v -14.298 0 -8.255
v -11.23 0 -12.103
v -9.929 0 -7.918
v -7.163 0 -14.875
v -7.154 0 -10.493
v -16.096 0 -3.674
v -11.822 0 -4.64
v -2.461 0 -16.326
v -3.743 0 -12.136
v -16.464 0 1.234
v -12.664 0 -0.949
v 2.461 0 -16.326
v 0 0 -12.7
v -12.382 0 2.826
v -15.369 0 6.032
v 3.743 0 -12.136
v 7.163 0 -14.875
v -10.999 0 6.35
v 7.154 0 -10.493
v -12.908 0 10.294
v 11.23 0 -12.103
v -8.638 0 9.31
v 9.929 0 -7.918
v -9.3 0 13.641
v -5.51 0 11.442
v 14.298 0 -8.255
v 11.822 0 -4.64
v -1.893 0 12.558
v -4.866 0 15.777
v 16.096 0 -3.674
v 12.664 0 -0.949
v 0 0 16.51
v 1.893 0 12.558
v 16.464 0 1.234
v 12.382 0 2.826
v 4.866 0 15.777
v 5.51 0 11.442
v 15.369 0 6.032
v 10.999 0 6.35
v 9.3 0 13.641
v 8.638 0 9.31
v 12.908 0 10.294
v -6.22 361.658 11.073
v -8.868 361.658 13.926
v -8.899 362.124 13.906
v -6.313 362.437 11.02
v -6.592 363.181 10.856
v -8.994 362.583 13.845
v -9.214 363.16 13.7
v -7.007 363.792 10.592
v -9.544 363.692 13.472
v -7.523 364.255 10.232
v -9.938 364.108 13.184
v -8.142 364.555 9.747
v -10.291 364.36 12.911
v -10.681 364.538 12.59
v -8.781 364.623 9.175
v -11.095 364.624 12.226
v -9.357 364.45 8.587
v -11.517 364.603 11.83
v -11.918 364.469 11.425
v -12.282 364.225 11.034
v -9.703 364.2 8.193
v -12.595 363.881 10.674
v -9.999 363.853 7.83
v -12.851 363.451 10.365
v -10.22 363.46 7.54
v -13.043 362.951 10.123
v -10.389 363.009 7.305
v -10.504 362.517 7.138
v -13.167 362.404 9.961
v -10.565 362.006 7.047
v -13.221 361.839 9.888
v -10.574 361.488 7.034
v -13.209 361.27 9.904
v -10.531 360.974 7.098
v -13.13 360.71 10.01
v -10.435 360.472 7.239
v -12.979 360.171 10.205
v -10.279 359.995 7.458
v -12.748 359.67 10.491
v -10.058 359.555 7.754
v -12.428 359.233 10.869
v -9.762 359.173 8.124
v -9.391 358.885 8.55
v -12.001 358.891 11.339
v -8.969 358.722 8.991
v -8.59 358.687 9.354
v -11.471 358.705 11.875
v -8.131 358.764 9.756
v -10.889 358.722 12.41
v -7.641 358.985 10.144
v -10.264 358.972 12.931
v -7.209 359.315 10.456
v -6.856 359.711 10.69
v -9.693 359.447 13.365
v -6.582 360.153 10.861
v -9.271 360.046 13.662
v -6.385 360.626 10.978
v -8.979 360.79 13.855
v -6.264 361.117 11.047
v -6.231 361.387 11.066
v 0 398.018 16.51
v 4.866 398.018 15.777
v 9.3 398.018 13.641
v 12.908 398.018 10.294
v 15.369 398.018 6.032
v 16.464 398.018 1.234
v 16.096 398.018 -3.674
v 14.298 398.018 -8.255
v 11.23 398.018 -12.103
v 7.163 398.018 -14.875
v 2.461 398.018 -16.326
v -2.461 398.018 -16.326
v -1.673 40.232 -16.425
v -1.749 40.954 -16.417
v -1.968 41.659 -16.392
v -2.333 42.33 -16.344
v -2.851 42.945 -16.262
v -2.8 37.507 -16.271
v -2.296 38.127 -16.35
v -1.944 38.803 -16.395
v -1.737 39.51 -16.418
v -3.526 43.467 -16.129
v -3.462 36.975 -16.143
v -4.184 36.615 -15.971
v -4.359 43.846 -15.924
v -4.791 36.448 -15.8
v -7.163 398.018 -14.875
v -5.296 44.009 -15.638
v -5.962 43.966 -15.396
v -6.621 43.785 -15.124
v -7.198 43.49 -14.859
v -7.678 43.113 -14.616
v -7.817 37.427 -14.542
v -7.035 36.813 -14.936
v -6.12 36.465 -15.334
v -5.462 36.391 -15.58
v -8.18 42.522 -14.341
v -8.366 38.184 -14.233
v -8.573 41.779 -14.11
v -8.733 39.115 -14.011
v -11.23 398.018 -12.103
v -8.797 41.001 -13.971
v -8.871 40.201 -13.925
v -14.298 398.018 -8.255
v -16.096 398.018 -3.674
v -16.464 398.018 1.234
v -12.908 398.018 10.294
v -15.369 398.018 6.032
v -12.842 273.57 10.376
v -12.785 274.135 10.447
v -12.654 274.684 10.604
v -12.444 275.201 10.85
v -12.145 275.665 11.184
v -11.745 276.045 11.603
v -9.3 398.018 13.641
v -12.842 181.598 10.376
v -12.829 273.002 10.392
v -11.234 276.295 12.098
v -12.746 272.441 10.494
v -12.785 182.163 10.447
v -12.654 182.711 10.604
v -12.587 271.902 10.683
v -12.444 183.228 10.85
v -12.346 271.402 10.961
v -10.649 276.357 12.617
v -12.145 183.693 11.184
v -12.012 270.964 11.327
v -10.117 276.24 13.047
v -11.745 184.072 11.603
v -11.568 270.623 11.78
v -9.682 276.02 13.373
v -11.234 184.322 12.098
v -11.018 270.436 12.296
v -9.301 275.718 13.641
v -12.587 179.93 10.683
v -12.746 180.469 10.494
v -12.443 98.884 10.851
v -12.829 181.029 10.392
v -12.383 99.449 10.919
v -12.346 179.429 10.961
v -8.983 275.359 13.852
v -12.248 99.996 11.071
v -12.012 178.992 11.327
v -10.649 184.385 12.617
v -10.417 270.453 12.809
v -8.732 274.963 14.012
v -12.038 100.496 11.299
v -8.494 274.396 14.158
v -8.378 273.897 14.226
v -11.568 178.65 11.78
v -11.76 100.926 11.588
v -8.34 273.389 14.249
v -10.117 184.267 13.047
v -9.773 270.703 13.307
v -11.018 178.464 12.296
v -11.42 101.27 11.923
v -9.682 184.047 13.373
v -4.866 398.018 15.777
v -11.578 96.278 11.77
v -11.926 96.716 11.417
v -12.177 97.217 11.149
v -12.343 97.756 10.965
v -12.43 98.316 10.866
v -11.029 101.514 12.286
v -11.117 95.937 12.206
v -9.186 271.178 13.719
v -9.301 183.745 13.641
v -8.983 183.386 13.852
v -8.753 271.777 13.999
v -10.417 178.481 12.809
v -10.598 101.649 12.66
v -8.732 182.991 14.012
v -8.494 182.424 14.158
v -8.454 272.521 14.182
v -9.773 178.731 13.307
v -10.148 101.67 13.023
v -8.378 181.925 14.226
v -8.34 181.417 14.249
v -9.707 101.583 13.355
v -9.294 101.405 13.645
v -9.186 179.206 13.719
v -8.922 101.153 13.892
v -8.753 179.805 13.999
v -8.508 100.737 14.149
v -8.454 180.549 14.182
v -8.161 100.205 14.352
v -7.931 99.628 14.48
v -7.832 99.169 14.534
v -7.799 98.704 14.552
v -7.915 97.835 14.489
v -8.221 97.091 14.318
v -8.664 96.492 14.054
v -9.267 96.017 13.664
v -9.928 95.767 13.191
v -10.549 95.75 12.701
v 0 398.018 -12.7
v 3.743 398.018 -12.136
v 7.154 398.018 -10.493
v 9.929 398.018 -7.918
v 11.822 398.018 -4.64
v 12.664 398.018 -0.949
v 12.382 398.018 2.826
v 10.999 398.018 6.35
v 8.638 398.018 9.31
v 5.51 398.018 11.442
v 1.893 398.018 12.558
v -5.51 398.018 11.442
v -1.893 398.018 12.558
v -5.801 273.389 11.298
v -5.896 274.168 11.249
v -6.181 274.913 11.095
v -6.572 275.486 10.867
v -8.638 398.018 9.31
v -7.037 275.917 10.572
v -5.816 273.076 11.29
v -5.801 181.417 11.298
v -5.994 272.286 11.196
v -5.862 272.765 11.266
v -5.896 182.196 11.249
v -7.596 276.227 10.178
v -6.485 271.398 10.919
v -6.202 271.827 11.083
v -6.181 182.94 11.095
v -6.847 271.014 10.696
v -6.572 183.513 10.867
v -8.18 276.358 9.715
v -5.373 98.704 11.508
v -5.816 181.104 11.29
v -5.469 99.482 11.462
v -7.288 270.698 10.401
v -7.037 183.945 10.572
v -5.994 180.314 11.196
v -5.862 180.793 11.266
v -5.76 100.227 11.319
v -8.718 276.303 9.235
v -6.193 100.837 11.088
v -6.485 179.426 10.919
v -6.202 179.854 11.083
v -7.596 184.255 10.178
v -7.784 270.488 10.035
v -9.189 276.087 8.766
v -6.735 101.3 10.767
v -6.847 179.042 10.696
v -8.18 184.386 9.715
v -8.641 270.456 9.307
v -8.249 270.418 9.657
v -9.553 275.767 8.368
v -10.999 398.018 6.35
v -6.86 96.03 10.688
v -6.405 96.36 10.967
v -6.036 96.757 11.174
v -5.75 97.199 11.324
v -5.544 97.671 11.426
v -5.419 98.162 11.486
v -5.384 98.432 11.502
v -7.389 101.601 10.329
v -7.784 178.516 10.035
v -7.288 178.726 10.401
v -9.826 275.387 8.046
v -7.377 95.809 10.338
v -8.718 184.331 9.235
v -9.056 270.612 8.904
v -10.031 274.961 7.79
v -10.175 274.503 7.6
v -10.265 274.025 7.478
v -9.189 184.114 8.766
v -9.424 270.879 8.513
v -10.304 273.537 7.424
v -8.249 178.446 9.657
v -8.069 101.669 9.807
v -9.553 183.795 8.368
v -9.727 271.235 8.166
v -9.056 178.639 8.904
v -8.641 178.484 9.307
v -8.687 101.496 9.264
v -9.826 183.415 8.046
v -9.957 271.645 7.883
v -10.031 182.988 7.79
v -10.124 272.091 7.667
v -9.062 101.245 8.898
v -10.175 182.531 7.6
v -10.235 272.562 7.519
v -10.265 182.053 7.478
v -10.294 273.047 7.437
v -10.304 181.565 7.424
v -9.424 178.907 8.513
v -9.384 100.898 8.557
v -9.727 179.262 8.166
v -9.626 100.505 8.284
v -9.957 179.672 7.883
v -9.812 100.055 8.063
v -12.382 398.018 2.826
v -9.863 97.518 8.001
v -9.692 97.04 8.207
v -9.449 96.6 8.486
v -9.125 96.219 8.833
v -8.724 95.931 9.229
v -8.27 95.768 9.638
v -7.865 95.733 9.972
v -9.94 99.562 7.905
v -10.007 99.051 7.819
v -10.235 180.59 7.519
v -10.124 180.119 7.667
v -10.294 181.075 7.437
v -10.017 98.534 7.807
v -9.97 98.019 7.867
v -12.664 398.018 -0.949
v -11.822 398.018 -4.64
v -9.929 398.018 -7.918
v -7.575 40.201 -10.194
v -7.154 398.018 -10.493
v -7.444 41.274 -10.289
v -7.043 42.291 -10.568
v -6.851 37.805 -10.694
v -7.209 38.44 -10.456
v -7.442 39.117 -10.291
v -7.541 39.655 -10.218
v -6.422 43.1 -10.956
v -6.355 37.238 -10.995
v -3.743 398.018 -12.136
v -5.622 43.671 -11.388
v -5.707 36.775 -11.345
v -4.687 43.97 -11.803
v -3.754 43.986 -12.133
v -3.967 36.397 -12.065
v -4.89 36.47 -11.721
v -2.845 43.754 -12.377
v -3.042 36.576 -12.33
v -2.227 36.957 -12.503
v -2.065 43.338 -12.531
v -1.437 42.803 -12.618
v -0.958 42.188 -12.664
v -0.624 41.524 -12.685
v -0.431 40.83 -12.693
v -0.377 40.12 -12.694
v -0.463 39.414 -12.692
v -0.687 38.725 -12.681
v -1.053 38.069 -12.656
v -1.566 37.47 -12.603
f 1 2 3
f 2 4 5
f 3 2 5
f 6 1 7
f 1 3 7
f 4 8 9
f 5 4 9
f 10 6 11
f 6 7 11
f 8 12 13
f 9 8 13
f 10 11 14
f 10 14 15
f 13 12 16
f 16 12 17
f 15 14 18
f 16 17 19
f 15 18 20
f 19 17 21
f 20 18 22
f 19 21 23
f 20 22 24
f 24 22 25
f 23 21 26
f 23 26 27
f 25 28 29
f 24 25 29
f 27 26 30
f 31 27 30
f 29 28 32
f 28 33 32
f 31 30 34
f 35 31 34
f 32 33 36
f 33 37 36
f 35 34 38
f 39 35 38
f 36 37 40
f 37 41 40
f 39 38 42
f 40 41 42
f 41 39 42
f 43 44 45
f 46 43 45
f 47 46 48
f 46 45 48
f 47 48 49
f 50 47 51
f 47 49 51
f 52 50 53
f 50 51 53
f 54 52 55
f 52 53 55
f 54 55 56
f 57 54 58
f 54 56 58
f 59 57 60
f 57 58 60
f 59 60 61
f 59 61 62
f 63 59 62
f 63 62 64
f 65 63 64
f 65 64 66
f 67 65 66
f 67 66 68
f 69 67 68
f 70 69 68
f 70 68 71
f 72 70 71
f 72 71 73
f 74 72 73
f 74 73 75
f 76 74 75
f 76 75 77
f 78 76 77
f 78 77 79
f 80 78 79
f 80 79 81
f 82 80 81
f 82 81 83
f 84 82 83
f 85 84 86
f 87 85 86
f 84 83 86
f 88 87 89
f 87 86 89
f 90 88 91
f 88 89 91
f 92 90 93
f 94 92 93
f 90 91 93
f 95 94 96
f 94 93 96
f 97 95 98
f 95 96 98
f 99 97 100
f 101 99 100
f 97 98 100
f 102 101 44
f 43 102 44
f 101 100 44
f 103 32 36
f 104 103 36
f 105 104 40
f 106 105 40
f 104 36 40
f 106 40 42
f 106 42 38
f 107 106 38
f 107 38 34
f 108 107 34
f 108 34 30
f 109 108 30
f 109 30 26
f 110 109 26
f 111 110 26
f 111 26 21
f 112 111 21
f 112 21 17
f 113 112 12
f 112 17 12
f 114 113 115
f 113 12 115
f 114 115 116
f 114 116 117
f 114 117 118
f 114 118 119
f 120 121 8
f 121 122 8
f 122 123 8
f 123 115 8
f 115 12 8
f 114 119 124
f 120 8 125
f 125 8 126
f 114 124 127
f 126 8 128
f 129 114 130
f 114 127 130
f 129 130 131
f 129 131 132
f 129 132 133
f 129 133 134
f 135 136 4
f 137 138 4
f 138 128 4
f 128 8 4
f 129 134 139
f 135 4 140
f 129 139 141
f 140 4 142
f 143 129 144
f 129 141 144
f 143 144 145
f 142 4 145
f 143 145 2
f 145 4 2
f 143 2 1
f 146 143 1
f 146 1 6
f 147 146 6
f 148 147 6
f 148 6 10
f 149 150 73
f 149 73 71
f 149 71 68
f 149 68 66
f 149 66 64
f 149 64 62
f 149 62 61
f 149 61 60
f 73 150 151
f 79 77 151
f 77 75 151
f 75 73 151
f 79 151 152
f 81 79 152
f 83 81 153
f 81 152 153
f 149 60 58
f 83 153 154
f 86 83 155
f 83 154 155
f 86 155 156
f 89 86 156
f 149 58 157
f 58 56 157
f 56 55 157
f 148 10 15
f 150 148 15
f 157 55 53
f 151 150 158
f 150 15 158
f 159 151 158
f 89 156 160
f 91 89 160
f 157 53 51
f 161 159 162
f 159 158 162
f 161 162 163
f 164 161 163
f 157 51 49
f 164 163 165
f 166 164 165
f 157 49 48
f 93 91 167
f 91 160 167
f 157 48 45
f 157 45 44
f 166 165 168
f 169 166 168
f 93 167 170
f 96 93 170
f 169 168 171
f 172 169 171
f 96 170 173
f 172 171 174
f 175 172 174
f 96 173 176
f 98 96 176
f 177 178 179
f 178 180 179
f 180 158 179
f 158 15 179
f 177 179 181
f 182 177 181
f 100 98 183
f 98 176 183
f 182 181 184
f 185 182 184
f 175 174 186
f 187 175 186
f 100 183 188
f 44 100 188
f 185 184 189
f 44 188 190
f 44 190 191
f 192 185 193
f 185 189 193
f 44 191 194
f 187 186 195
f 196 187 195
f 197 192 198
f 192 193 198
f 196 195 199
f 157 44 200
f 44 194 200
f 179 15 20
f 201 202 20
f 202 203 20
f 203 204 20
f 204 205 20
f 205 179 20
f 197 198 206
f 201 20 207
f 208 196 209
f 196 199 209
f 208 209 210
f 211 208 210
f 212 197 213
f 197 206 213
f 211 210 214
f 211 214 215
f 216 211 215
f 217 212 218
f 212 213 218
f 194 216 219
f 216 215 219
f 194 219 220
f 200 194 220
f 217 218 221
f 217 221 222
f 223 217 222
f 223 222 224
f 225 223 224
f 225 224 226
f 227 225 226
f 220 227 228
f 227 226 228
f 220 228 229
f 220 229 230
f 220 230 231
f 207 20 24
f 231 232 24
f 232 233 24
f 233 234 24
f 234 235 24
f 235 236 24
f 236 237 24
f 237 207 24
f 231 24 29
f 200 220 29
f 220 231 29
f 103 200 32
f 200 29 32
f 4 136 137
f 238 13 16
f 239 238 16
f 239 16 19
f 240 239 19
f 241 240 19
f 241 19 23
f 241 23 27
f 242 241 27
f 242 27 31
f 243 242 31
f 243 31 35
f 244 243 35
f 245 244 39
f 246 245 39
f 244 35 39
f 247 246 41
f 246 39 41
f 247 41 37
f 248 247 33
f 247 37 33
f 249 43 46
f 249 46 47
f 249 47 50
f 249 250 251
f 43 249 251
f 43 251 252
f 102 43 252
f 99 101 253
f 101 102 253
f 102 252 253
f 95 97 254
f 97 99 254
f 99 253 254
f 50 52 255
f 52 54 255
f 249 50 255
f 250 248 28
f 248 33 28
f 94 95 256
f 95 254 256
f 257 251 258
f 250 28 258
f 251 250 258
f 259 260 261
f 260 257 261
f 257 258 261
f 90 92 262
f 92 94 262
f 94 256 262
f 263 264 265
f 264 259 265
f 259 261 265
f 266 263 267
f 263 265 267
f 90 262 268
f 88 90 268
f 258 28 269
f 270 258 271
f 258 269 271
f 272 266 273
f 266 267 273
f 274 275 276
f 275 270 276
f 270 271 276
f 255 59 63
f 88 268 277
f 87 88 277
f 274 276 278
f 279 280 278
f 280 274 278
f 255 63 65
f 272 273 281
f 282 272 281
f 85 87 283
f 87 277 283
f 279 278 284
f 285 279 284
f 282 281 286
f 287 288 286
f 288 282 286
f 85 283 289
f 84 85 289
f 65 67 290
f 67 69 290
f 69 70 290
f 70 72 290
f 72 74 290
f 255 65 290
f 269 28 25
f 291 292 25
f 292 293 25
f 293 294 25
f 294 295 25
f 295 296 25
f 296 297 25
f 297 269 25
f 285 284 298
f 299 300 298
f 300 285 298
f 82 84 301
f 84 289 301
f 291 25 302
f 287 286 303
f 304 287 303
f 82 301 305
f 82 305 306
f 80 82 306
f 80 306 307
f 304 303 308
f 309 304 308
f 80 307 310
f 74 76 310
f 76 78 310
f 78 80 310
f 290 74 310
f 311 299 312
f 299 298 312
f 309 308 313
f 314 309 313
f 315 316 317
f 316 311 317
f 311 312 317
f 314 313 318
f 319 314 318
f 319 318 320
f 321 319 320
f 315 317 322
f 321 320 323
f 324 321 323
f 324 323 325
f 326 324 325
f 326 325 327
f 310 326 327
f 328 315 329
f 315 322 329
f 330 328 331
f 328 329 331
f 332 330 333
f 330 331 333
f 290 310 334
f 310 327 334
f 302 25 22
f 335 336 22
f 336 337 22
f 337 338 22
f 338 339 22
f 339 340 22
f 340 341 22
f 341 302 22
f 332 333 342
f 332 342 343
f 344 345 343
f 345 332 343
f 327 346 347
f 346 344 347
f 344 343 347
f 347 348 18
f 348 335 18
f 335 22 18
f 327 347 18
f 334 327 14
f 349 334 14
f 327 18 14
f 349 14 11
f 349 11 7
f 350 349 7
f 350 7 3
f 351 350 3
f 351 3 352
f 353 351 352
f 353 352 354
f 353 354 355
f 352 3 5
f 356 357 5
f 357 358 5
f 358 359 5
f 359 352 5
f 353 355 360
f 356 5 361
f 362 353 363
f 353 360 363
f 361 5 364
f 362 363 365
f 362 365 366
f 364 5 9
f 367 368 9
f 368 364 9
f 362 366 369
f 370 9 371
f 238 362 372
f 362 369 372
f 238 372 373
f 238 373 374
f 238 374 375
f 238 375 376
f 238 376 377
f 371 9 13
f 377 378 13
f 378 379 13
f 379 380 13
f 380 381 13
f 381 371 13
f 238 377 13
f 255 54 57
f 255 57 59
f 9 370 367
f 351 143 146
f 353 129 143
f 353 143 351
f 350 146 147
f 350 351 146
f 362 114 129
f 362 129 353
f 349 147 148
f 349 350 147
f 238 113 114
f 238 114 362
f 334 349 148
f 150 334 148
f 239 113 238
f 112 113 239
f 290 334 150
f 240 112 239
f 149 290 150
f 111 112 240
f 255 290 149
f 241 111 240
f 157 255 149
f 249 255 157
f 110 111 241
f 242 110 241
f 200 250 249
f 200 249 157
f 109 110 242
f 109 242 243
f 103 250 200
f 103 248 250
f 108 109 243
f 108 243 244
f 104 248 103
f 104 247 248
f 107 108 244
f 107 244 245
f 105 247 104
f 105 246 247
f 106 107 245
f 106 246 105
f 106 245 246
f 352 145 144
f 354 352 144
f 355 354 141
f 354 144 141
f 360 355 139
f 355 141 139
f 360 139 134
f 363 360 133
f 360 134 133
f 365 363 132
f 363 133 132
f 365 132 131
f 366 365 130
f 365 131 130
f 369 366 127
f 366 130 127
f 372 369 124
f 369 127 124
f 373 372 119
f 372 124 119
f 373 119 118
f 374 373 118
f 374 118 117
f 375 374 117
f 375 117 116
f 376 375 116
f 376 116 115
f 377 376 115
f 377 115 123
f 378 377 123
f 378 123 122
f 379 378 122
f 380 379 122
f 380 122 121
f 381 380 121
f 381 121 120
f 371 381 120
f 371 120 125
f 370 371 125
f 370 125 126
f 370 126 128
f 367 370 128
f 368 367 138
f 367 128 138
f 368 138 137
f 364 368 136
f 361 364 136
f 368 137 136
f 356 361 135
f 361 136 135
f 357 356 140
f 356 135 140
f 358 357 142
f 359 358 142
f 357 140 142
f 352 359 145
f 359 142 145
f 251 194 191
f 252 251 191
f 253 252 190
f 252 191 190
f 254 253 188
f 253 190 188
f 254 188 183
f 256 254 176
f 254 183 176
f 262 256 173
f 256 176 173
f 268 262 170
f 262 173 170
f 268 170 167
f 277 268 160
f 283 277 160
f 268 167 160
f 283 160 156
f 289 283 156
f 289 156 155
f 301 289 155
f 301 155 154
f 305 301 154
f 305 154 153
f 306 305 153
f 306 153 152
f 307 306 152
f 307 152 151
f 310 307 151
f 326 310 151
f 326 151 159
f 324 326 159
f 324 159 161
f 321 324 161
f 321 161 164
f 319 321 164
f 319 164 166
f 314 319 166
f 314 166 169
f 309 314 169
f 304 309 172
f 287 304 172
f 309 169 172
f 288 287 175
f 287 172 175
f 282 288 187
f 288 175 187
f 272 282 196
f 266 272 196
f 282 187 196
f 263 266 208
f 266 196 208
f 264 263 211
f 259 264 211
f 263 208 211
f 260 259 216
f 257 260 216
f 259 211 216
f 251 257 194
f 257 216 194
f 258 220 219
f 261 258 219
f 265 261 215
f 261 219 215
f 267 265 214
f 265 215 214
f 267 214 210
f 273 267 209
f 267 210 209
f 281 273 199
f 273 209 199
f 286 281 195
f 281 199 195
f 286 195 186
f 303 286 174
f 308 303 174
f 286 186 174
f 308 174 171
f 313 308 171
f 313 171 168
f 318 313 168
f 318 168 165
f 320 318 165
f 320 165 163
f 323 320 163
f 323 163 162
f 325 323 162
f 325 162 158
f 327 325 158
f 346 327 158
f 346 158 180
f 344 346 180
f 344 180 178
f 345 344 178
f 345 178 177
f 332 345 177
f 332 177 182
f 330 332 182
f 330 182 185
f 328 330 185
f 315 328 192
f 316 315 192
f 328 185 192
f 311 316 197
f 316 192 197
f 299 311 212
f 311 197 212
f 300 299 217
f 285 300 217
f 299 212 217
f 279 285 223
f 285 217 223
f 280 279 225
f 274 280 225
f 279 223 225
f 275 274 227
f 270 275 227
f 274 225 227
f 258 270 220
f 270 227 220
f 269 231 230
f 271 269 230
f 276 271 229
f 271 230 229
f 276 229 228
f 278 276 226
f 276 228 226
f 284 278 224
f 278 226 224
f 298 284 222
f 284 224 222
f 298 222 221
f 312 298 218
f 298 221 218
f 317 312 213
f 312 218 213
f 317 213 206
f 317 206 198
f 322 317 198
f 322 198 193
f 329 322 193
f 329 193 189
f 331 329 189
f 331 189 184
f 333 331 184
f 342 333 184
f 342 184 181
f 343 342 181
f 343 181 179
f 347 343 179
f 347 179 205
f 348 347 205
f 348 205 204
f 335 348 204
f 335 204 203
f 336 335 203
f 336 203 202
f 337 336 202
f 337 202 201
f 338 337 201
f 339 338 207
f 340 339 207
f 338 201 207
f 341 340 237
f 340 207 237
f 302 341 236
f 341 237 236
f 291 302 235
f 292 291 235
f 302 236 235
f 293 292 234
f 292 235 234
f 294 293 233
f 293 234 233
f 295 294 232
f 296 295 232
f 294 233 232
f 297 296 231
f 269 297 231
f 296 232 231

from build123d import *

# Parameters (mm, degrees)
SKETCH2_R                              = 16.51
BOSS_EXTRUDE1_DEPTH                    = 398.018
SKETCH3_R                              = 12.7
CUT_EXTRUDE1_DEPTH                     = 398.018
A_0_234_DIAMETER_HOLE1_REACH           = 365.847
A_0_234_DIAMETER_HOLE1_BORE_R          = 2.9718
A_0_234_DIAMETER_HOLE1_ON_FACE_2_REACH = 278.276
A_0_234_DIAMETER_HOLE1_BORE_2_R        = 2.9718
A_0_234_DIAMETER_HOLE1_ON_FACE_3_REACH = 303.949
A_0_234_DIAMETER_HOLE1_BORE_3_R        = 2.9718
N_0_302_DIAMETER_HOLE1_REACH           = 361.923
N_0_302_DIAMETER_HOLE1_BORE_R          = 3.81


with BuildPart() as part:
    # Sketch2 → Boss-Extrude1 (new body)
    with BuildSketch(Plane(origin=(0, 0, 0), x_dir=(1, 0, 0), z_dir=(0, 1, 0))):
        with Locations(Location((0, 0, 0), (0, 0, 270))):
            Circle(SKETCH2_R)
    extrude(amount=BOSS_EXTRUDE1_DEPTH)

    # Sketch3 → Cut-Extrude1 (cut)
    with BuildSketch(Plane.XZ):
        with Locations(Location((0, 0, 0), (0, 0, 270))):
            Circle(SKETCH3_R)
    extrude(amount=-CUT_EXTRUDE1_DEPTH, mode=Mode.SUBTRACT)

    # A (0.234) Diameter Hole1 bore (on position points) → A (0.234) Diameter Hole1 (cut, up to next)
    with BuildSketch(Plane(origin=(-11.22969926, 361.658078854, 12.10264246), x_dir=(0.733049210198, 0, 0.680175606317), z_dir=(-0.680175606317, 0, 0.733049210198)), mode=Mode.PRIVATE) as a_0_234_diameter_hole1_sk1:
        Circle(A_0_234_DIAMETER_HOLE1_BORE_R)
    a_0_234_diameter_hole1_tool1 = extrude(a_0_234_diameter_hole1_sk1.sketch, amount=-A_0_234_DIAMETER_HOLE1_REACH, mode=Mode.PRIVATE) & part.part
    add(a_0_234_diameter_hole1_tool1.solids().sort_by_distance((-11.229699, 361.658079, 12.102642))[0], mode=Mode.SUBTRACT)

    # A (0.234) Diameter Hole1 bore 2 (on position points) → A (0.234) Diameter Hole1 on face 2 (cut, up to next)
    with BuildSketch(Plane(origin=(-10.768707034, 273.389318793, 12.514593434), x_dir=(0.75800069812, 0, 0.652253740234), z_dir=(-0.652253740234, 0, 0.75800069812)), mode=Mode.PRIVATE) as a_0_234_diameter_hole1_on_face_2_sk1:
        Circle(A_0_234_DIAMETER_HOLE1_BORE_2_R)
    a_0_234_diameter_hole1_on_face_2_tool1 = extrude(a_0_234_diameter_hole1_on_face_2_sk1.sketch, amount=-A_0_234_DIAMETER_HOLE1_ON_FACE_2_REACH, mode=Mode.PRIVATE) & part.part
    # A (0.234) Diameter Hole1 bore 2 (on position points) → A (0.234) Diameter Hole1 on face 2 (cut, up to next)
    with BuildSketch(Plane(origin=(-10.768707034, 273.389318793, 12.514593434), x_dir=(0.75800069812, 0, 0.652253740234), z_dir=(-0.652253740234, 0, 0.75800069812)), mode=Mode.PRIVATE) as a_0_234_diameter_hole1_on_face_2_sk2:
        with Locations((0, -91.9723444)):
            Circle(A_0_234_DIAMETER_HOLE1_BORE_2_R)
    a_0_234_diameter_hole1_on_face_2_tool2 = extrude(a_0_234_diameter_hole1_on_face_2_sk2.sketch, amount=-A_0_234_DIAMETER_HOLE1_ON_FACE_2_REACH, mode=Mode.PRIVATE) & part.part
    add(a_0_234_diameter_hole1_on_face_2_tool1.solids().sort_by_distance((-10.768707, 273.389319, 12.514593))[0], mode=Mode.SUBTRACT)
    add(a_0_234_diameter_hole1_on_face_2_tool2.solids().sort_by_distance((-10.768707, 181.416974, 12.514593))[0], mode=Mode.SUBTRACT)

    # A (0.234) Diameter Hole1 bore 3 (on position points) → A (0.234) Diameter Hole1 on face 3 (cut, up to next)
    with BuildSketch(Plane(origin=(-10.291252546, 98.70359084, 12.910082147), x_dir=(0.781955431021, 0, 0.623334343588), z_dir=(-0.623334343588, 0, 0.781955431021)), mode=Mode.PRIVATE) as a_0_234_diameter_hole1_on_face_3_sk1:
        Circle(A_0_234_DIAMETER_HOLE1_BORE_3_R)
    a_0_234_diameter_hole1_on_face_3_tool1 = extrude(a_0_234_diameter_hole1_on_face_3_sk1.sketch, amount=-A_0_234_DIAMETER_HOLE1_ON_FACE_3_REACH, mode=Mode.PRIVATE) & part.part
    add(a_0_234_diameter_hole1_on_face_3_tool1.solids().sort_by_distance((-10.291253, 98.703591, 12.910082))[0], mode=Mode.SUBTRACT)

    # N (0.302) Diameter Hole1 bore (on position points) → N (0.302) Diameter Hole1 (cut, up to next)
    with BuildSketch(Plane(origin=(-5.417804763, 40.200816881, -15.595752356), x_dir=(-0.944624612714, 0, 0.328152923277), z_dir=(-0.328152923277, 0, -0.944624612714)), mode=Mode.PRIVATE) as n_0_302_diameter_hole1_sk1:
        Circle(N_0_302_DIAMETER_HOLE1_BORE_R)
    n_0_302_diameter_hole1_tool1 = extrude(n_0_302_diameter_hole1_sk1.sketch, amount=-N_0_302_DIAMETER_HOLE1_REACH, mode=Mode.PRIVATE) & part.part
    add(n_0_302_diameter_hole1_tool1.solids().sort_by_distance((-5.417805, 40.200817, -15.595752))[0], mode=Mode.SUBTRACT)


solid = part.part
